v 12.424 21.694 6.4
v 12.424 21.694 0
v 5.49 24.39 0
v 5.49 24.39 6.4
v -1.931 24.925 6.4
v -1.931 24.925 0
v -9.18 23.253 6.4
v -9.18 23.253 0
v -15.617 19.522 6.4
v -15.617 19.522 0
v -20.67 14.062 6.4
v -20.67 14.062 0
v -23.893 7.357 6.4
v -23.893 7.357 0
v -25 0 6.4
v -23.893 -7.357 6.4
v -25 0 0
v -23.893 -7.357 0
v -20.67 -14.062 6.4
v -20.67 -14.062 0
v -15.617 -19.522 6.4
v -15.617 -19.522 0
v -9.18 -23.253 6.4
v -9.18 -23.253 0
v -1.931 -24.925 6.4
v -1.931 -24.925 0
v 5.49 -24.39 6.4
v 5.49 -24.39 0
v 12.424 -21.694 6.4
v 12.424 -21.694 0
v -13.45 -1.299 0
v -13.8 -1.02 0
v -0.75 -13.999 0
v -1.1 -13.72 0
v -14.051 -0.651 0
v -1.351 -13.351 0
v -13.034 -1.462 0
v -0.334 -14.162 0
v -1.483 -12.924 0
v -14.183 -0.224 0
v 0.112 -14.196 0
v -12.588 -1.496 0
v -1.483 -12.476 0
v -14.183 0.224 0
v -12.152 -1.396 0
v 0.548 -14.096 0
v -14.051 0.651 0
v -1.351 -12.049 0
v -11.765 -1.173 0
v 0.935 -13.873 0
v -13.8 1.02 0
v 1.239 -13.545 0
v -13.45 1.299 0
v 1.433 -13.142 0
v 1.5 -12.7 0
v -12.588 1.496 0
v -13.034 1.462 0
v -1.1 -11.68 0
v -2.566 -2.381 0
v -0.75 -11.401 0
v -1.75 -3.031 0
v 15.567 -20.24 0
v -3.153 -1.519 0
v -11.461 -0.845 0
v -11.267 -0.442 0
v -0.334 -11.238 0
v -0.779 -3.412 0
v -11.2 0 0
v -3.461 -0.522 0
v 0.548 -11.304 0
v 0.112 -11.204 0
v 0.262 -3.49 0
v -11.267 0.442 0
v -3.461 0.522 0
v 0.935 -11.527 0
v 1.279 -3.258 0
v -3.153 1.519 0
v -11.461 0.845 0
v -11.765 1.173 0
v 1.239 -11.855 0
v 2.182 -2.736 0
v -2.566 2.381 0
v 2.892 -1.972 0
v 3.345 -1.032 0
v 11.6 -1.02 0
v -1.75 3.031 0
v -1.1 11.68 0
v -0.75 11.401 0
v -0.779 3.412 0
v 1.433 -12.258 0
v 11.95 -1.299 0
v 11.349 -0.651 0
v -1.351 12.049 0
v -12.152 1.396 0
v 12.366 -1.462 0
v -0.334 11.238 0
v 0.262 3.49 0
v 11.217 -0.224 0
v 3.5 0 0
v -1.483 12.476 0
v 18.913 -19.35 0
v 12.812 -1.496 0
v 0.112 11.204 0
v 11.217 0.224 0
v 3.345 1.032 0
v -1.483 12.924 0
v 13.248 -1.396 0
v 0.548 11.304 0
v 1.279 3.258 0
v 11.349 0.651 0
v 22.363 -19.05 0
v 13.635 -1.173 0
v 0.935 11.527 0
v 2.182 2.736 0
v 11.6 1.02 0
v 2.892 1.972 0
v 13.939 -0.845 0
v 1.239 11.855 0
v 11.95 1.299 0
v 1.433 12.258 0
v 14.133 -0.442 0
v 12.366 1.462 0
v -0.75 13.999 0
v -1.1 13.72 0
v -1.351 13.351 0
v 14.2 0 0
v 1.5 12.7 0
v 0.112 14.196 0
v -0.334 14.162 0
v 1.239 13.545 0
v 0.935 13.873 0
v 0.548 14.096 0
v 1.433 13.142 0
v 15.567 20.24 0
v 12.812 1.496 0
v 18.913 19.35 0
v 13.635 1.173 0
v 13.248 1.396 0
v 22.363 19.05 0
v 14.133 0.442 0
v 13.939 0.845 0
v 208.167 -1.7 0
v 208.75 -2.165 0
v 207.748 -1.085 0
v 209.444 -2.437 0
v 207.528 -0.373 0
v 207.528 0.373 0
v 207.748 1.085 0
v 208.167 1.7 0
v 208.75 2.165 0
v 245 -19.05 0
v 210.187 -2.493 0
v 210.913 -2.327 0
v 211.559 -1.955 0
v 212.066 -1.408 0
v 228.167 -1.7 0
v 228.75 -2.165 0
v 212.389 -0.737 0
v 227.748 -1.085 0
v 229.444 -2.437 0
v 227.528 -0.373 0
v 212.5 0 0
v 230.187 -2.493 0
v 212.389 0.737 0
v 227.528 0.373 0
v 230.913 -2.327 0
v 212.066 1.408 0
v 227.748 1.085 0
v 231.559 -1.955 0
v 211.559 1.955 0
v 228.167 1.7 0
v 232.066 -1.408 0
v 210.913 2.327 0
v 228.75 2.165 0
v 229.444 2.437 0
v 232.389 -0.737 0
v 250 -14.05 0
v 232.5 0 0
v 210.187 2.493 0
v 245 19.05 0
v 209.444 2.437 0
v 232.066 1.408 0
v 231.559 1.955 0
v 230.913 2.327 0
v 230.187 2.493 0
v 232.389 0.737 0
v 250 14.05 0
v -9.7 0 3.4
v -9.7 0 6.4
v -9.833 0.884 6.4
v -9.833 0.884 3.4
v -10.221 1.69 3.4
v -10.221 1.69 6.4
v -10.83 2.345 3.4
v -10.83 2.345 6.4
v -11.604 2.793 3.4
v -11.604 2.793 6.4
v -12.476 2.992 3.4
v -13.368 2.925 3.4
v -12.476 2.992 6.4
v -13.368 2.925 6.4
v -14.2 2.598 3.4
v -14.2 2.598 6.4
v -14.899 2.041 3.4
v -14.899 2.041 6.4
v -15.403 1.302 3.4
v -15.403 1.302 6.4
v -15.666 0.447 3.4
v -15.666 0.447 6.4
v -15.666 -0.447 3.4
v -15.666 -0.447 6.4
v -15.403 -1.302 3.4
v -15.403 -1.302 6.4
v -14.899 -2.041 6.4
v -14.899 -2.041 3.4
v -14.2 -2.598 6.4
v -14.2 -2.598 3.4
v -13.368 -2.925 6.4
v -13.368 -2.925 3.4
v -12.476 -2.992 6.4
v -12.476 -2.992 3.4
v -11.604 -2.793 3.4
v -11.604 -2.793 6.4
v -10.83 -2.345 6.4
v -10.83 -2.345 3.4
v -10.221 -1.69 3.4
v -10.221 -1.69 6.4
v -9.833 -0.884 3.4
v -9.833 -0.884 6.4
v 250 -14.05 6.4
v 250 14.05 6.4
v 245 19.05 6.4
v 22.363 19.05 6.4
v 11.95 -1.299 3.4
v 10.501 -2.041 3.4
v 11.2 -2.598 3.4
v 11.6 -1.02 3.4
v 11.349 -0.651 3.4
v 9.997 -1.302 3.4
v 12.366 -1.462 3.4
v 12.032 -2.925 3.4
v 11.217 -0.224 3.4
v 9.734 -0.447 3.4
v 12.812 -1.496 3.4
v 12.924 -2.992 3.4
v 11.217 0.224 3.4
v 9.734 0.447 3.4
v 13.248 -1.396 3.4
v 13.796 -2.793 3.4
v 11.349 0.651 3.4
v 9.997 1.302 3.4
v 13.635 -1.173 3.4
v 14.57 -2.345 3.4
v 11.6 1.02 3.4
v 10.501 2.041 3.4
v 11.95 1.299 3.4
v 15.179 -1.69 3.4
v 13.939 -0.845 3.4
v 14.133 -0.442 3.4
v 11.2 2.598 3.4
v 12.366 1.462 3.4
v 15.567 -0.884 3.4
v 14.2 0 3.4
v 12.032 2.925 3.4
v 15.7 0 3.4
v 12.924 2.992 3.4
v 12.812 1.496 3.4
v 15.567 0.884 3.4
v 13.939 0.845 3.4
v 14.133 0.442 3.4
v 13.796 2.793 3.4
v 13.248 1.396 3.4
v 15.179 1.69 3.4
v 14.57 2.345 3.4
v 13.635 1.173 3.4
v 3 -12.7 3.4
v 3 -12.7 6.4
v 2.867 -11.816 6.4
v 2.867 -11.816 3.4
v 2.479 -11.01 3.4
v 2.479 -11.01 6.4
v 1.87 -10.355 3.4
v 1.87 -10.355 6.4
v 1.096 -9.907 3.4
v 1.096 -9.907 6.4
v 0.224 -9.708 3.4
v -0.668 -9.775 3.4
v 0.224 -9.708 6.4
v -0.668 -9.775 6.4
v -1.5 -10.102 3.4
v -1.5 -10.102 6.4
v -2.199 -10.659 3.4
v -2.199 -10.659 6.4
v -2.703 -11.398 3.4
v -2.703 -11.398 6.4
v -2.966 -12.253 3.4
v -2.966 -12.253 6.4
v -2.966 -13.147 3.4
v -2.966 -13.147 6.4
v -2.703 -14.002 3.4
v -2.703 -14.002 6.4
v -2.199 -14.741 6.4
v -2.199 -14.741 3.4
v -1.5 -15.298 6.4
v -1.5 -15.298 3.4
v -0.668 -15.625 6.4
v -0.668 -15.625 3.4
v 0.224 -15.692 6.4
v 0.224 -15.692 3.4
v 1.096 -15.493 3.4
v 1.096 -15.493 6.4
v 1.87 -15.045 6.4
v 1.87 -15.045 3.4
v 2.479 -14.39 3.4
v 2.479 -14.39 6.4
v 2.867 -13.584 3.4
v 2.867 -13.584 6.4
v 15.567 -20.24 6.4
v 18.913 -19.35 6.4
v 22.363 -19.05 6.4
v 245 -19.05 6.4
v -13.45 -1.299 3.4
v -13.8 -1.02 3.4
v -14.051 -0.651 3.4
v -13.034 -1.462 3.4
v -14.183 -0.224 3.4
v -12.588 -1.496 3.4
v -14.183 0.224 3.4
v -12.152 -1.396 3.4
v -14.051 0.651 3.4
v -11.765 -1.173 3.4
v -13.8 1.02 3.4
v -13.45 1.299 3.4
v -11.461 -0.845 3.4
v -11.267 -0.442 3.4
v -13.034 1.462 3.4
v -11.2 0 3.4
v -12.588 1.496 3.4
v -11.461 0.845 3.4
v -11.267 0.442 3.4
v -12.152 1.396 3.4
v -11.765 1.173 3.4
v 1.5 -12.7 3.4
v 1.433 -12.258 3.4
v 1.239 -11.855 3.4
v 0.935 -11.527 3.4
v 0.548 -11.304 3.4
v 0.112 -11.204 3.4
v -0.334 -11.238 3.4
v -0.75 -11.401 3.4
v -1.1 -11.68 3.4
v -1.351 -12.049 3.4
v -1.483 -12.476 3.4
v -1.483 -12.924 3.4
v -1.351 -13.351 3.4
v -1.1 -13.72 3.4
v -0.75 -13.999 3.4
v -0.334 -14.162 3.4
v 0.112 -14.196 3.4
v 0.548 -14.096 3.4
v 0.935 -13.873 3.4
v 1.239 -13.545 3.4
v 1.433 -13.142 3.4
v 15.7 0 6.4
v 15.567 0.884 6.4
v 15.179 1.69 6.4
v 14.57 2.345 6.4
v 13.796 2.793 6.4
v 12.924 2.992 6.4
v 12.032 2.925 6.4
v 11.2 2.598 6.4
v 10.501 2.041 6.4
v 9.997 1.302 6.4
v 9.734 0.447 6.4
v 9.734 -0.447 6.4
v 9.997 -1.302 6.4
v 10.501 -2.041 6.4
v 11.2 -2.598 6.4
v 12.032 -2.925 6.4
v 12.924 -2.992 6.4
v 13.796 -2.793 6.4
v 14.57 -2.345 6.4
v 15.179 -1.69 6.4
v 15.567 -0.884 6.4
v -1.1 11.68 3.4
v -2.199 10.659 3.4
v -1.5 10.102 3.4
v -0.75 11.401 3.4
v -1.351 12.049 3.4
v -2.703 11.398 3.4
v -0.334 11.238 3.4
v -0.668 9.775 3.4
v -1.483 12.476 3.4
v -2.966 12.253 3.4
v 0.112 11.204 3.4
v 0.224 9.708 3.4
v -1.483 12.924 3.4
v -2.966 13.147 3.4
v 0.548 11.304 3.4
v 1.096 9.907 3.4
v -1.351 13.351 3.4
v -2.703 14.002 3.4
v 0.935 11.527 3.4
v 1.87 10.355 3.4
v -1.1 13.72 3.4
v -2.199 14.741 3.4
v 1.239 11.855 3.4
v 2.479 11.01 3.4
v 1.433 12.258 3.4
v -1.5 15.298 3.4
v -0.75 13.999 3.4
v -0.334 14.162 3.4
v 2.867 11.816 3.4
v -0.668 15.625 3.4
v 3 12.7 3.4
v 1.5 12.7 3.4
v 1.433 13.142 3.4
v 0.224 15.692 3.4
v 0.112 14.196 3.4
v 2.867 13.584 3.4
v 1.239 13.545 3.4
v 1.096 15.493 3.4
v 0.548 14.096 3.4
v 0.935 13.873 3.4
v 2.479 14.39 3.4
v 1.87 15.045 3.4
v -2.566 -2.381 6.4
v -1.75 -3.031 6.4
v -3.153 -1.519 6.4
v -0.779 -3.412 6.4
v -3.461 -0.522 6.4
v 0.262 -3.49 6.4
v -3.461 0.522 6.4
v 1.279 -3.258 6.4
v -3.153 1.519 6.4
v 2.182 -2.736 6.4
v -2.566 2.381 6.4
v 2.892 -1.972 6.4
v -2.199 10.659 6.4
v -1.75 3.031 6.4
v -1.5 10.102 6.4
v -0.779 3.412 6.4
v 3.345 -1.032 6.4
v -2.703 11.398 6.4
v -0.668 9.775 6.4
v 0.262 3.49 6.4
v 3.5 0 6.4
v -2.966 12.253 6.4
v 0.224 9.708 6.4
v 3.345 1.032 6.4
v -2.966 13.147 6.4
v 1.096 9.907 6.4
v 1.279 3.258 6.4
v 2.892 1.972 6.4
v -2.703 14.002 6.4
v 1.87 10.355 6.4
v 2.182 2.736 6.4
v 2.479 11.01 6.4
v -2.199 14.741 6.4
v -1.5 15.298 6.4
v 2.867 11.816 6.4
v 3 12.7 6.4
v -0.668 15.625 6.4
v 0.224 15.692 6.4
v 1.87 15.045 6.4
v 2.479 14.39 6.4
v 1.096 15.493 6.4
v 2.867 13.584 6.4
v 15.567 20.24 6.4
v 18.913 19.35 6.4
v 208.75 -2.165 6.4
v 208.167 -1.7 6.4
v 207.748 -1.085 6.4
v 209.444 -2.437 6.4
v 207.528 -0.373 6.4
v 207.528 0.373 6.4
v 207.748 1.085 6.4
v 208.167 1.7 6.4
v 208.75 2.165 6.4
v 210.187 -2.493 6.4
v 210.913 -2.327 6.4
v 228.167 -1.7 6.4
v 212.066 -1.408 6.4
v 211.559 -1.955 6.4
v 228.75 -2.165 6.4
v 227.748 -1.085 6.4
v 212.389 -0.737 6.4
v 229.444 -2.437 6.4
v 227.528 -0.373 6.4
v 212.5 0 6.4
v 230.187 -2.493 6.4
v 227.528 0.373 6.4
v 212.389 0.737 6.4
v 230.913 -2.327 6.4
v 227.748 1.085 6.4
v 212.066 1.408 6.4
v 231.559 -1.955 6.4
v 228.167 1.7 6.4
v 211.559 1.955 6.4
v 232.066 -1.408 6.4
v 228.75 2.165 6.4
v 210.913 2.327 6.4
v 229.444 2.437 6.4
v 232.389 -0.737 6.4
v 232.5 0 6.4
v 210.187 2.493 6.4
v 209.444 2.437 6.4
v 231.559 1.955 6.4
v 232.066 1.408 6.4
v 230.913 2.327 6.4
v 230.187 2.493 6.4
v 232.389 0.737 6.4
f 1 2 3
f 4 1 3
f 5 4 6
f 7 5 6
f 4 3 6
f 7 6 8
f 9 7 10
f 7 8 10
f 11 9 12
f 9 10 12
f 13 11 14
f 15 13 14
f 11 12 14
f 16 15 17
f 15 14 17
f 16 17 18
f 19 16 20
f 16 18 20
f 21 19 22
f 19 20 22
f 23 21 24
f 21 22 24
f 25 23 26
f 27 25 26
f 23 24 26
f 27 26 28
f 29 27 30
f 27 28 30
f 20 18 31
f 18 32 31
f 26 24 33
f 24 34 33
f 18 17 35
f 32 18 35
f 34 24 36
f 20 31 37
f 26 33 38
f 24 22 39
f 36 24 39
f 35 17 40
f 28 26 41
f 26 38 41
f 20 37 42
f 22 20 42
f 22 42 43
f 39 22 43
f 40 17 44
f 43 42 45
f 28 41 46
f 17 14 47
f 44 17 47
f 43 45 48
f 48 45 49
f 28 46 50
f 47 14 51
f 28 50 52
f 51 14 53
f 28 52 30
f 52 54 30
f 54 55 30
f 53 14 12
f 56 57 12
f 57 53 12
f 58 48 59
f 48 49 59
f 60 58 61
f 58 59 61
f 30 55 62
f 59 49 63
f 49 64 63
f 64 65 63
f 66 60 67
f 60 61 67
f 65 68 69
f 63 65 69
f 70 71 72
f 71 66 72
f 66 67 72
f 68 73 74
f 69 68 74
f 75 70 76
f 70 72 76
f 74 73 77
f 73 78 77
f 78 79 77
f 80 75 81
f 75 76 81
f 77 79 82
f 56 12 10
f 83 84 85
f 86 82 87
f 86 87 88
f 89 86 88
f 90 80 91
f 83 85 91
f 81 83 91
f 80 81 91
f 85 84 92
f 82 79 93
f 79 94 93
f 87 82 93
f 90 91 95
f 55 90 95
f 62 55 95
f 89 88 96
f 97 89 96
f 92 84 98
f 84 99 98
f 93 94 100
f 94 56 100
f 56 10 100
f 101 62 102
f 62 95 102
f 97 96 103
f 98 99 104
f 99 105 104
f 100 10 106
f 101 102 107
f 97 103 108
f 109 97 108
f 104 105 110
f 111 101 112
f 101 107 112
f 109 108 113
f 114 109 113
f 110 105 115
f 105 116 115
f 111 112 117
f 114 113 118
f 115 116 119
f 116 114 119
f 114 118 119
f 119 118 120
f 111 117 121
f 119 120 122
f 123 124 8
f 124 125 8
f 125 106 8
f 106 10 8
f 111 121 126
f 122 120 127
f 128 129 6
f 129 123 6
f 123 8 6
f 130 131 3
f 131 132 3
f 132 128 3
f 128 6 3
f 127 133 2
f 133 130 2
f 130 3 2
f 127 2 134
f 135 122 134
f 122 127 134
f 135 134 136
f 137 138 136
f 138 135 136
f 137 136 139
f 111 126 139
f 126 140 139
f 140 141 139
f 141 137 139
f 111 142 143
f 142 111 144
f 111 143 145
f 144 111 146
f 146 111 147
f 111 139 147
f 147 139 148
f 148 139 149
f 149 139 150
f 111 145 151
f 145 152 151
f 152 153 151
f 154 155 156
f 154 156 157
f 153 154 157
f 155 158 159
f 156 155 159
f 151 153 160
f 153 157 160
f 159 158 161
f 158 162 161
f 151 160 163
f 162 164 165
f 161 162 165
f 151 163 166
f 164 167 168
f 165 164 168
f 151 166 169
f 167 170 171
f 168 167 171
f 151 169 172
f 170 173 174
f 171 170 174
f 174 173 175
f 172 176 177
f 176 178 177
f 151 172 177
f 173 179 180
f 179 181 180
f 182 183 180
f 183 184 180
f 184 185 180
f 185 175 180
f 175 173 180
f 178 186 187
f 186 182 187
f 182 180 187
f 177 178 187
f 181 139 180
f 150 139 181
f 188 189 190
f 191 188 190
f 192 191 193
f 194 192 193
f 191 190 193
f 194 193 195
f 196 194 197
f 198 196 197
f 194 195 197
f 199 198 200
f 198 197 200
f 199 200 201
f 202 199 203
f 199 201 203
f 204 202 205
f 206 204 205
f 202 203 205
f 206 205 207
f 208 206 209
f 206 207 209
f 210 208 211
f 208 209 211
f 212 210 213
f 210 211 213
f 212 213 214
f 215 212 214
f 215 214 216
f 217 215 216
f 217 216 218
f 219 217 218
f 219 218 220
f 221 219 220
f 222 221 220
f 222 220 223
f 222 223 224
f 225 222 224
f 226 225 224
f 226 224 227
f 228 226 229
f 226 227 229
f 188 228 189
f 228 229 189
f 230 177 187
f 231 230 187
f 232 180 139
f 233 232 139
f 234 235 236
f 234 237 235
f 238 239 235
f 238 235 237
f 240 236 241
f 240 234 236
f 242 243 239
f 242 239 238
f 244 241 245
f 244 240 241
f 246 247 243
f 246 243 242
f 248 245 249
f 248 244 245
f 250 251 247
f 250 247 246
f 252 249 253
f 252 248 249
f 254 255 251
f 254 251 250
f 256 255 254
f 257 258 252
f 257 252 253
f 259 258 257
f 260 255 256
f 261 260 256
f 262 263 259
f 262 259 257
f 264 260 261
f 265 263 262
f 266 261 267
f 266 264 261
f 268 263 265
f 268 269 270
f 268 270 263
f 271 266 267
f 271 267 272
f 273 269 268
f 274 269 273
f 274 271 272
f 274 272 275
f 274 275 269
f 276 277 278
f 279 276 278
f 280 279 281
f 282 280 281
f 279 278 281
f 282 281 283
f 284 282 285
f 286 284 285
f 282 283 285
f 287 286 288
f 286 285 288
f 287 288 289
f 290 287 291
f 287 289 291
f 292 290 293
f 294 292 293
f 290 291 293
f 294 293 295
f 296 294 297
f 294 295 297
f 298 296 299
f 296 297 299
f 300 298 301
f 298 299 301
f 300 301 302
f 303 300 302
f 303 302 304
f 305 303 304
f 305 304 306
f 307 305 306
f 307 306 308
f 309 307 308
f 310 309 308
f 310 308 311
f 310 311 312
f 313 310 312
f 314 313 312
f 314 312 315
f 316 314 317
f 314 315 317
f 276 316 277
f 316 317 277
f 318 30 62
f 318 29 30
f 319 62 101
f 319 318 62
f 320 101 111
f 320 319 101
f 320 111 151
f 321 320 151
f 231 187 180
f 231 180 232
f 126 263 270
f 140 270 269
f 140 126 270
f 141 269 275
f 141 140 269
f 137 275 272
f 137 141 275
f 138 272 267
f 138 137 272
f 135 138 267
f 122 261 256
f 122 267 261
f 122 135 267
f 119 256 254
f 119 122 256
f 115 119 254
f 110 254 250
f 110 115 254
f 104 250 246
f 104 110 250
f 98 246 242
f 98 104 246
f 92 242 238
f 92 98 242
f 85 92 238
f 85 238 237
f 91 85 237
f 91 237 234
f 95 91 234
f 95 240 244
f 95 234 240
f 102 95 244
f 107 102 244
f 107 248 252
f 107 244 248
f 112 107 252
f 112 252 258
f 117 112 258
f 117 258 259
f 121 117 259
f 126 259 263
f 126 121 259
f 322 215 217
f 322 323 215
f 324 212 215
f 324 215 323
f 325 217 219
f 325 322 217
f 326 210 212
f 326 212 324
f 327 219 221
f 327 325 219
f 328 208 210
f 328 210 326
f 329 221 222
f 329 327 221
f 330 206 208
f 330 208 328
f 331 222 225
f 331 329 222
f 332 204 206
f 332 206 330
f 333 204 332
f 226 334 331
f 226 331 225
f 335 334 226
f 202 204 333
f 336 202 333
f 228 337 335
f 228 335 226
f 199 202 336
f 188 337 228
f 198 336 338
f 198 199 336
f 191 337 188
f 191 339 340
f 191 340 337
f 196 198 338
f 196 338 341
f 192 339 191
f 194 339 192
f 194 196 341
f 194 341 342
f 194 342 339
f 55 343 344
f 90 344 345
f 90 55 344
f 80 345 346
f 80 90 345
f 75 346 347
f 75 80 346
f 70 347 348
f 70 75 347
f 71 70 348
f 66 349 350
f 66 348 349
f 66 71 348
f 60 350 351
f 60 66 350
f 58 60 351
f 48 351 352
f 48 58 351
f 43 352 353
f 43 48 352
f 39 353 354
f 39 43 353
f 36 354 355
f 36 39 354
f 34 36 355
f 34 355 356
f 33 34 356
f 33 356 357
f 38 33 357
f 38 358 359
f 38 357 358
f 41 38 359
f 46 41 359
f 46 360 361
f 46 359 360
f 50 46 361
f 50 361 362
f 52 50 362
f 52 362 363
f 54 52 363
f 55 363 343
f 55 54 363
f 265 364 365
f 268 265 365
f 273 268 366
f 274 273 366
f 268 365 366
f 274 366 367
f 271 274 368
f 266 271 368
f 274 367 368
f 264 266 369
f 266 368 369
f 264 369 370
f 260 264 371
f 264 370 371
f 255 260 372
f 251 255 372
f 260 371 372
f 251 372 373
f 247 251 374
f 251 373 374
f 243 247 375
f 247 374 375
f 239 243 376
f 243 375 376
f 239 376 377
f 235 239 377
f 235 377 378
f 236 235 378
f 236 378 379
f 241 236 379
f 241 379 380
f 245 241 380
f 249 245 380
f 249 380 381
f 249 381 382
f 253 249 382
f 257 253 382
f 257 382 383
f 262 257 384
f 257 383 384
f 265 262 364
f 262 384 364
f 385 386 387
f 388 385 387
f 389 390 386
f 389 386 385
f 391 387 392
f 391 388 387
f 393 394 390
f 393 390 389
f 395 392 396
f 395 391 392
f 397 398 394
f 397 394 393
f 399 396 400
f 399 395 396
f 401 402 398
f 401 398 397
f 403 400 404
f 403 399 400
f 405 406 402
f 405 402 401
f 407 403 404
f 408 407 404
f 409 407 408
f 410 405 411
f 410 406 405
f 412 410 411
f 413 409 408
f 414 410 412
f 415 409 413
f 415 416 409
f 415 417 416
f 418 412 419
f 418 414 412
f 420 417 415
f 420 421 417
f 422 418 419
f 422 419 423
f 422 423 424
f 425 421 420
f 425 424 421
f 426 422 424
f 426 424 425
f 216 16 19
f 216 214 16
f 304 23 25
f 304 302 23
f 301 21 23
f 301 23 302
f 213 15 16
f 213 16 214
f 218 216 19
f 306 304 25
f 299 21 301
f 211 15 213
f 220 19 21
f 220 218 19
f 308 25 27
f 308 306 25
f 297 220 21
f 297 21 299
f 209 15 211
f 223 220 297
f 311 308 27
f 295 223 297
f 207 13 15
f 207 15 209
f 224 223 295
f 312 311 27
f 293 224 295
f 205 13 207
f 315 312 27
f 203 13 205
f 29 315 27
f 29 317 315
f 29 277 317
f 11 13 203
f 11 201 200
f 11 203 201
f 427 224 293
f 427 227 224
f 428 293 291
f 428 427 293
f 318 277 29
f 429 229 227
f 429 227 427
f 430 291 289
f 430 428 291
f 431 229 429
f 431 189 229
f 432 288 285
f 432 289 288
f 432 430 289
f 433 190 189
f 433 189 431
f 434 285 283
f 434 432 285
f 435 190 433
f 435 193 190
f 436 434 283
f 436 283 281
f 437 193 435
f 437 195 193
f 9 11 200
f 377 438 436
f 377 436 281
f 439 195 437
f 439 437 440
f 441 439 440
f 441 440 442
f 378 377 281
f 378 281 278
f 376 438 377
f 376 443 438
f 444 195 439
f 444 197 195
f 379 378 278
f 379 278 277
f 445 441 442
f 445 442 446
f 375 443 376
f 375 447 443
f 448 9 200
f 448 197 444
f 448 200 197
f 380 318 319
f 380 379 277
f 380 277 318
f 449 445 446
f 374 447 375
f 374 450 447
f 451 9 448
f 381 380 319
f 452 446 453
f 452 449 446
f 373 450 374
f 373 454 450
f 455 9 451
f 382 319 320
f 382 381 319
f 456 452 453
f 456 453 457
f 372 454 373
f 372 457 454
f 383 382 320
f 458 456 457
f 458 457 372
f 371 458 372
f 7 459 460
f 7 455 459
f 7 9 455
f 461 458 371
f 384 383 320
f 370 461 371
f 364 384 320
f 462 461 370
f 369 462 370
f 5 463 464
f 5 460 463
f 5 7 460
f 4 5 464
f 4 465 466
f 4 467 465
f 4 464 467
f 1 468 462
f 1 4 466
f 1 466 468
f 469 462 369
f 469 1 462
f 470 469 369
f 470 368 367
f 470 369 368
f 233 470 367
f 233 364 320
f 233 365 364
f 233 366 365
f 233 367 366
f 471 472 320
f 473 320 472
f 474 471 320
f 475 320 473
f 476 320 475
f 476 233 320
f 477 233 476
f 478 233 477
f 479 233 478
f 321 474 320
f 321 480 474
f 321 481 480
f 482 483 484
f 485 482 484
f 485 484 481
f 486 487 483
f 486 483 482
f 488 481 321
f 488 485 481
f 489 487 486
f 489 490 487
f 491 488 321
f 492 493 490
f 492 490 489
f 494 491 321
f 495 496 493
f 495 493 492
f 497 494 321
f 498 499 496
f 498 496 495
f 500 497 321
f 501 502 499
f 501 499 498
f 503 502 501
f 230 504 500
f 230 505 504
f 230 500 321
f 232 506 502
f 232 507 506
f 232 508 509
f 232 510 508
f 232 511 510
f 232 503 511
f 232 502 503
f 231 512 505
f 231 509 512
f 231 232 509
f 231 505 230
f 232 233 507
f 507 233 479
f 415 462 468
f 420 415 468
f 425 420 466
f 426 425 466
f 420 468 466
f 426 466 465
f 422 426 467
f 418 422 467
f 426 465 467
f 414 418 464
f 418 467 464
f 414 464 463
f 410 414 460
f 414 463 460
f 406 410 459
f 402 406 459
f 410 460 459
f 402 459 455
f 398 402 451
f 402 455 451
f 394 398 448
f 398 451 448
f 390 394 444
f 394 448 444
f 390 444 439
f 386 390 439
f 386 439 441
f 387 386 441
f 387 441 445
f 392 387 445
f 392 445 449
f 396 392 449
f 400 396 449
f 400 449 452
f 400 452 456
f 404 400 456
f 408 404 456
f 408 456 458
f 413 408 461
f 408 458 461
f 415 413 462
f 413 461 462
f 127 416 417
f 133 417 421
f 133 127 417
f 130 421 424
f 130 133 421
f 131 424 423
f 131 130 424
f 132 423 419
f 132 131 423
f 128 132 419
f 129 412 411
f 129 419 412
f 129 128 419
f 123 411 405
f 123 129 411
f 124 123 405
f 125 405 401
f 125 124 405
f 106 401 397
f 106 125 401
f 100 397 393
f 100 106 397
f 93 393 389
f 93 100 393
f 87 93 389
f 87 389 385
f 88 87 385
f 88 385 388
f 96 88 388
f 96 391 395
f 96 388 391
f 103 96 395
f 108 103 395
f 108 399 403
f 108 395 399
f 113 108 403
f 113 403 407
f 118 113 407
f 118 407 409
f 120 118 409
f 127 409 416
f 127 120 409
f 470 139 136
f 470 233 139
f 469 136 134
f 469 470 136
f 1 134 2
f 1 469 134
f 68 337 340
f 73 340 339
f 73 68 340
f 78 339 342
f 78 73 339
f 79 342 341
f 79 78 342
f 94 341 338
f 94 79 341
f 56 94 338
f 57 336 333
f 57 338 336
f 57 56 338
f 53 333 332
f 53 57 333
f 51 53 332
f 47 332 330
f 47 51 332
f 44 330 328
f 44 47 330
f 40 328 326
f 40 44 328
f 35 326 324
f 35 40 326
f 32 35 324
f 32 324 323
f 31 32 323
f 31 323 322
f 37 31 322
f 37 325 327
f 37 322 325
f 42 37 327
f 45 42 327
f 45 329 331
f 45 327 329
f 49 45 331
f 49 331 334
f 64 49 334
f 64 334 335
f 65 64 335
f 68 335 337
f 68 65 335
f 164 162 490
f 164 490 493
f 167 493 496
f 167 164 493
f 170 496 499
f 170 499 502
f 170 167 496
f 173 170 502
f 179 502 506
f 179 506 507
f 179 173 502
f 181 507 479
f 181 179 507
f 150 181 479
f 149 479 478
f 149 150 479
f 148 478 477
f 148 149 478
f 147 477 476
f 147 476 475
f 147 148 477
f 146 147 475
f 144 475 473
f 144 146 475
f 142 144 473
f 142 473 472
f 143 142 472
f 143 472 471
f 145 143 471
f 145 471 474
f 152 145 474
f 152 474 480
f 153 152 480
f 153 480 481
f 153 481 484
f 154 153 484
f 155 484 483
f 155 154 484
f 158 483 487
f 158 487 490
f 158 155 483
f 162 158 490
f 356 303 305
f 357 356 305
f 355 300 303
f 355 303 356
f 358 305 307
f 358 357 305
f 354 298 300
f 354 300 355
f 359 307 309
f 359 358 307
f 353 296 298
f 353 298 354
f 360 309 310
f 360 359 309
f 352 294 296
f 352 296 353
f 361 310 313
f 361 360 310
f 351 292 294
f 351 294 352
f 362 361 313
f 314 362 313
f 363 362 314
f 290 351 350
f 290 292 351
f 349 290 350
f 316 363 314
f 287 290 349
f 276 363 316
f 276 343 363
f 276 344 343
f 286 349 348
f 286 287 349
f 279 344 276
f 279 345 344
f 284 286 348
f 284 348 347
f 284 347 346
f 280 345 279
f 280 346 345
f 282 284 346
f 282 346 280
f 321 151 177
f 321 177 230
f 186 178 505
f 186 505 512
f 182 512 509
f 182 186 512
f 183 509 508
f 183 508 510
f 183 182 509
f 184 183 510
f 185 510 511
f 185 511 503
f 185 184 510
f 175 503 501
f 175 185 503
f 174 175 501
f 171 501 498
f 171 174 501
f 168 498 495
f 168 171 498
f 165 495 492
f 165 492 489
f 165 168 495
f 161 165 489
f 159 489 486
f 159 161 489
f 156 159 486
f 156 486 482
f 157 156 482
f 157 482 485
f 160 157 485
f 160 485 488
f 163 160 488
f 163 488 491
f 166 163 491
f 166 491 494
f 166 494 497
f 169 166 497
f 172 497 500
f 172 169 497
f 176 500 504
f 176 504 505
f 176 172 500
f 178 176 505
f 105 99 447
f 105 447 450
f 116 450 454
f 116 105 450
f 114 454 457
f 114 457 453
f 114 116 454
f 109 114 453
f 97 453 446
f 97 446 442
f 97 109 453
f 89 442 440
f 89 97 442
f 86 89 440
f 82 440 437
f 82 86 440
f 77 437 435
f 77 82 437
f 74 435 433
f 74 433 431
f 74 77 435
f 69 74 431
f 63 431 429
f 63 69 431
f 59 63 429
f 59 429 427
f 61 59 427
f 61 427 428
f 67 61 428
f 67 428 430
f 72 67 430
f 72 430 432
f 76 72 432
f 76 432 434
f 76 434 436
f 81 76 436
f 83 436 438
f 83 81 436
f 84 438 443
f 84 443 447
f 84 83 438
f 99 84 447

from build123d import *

# Parameters (mm, degrees)
SKETCH1_R           = 2.5
SKETCH1_R_2         = 1.5
SKETCH1_R_3         = 3.5
BOSS_EXTRUDE1_DEPTH = 6.4
SKETCH2_R           = 3
CUT_EXTRUDE1_DEPTH  = 3
FILLET1_R           = 20
CHAMFER1_SIZE       = 5


with BuildPart() as part:
    # Sketch1 → Boss-Extrude1 (new body)
    with BuildSketch(Plane.XY):
        with BuildLine():
            Line((250, 19.05), (16.189425561, 19.05))
            ThreePointArc((16.189425561, 19.05), (-25, 0), (16.189425561, -19.05))
            Line((16.189425561, -19.05), (250, -19.05))
            Line((250, -19.05), (250, 19.05))
        make_face()
        with Locations((230, 0)):
            Circle(SKETCH1_R, mode=Mode.SUBTRACT)
        with Locations((210, 0)):
            Circle(SKETCH1_R, mode=Mode.SUBTRACT)
        with Locations((0, 12.7)):
            Circle(SKETCH1_R_2, mode=Mode.SUBTRACT)
        with Locations((12.7, 0)):
            Circle(SKETCH1_R_2, mode=Mode.SUBTRACT)
        with Locations((0, -12.7)):
            Circle(SKETCH1_R_2, mode=Mode.SUBTRACT)
        with Locations((-12.7, 0)):
            Circle(SKETCH1_R_2, mode=Mode.SUBTRACT)
        Circle(SKETCH1_R_3, mode=Mode.SUBTRACT)
    extrude(amount=BOSS_EXTRUDE1_DEPTH)

    # Sketch2 → Cut-Extrude1 (cut)
    with BuildSketch(Plane.XY.offset(6.4)):
        with Locations((0, 12.7)):
            Circle(SKETCH2_R)
        with Locations((12.7, 0)):
            Circle(SKETCH2_R)
        with Locations((0, -12.7)):
            Circle(SKETCH2_R)
        with Locations((-12.7, 0)):
            Circle(SKETCH2_R)
    extrude(amount=-CUT_EXTRUDE1_DEPTH, mode=Mode.SUBTRACT)

    # Fillet1
    fillet1_edges = [part.edges().sort_by_distance(p)[0] for p in [
        (16.189425561, -19.05, 3.2),
        (16.189425561, 19.05, 3.2),
    ]]
    fillet(fillet1_edges, radius=FILLET1_R)

    # Chamfer1
    chamfer1_edges = [part.edges().sort_by_distance(p)[0] for p in [
        (250, -19.05, 3.2),
        (250, 19.05, 3.2),
    ]]
    chamfer(chamfer1_edges, length=CHAMFER1_SIZE)


solid = part.part
